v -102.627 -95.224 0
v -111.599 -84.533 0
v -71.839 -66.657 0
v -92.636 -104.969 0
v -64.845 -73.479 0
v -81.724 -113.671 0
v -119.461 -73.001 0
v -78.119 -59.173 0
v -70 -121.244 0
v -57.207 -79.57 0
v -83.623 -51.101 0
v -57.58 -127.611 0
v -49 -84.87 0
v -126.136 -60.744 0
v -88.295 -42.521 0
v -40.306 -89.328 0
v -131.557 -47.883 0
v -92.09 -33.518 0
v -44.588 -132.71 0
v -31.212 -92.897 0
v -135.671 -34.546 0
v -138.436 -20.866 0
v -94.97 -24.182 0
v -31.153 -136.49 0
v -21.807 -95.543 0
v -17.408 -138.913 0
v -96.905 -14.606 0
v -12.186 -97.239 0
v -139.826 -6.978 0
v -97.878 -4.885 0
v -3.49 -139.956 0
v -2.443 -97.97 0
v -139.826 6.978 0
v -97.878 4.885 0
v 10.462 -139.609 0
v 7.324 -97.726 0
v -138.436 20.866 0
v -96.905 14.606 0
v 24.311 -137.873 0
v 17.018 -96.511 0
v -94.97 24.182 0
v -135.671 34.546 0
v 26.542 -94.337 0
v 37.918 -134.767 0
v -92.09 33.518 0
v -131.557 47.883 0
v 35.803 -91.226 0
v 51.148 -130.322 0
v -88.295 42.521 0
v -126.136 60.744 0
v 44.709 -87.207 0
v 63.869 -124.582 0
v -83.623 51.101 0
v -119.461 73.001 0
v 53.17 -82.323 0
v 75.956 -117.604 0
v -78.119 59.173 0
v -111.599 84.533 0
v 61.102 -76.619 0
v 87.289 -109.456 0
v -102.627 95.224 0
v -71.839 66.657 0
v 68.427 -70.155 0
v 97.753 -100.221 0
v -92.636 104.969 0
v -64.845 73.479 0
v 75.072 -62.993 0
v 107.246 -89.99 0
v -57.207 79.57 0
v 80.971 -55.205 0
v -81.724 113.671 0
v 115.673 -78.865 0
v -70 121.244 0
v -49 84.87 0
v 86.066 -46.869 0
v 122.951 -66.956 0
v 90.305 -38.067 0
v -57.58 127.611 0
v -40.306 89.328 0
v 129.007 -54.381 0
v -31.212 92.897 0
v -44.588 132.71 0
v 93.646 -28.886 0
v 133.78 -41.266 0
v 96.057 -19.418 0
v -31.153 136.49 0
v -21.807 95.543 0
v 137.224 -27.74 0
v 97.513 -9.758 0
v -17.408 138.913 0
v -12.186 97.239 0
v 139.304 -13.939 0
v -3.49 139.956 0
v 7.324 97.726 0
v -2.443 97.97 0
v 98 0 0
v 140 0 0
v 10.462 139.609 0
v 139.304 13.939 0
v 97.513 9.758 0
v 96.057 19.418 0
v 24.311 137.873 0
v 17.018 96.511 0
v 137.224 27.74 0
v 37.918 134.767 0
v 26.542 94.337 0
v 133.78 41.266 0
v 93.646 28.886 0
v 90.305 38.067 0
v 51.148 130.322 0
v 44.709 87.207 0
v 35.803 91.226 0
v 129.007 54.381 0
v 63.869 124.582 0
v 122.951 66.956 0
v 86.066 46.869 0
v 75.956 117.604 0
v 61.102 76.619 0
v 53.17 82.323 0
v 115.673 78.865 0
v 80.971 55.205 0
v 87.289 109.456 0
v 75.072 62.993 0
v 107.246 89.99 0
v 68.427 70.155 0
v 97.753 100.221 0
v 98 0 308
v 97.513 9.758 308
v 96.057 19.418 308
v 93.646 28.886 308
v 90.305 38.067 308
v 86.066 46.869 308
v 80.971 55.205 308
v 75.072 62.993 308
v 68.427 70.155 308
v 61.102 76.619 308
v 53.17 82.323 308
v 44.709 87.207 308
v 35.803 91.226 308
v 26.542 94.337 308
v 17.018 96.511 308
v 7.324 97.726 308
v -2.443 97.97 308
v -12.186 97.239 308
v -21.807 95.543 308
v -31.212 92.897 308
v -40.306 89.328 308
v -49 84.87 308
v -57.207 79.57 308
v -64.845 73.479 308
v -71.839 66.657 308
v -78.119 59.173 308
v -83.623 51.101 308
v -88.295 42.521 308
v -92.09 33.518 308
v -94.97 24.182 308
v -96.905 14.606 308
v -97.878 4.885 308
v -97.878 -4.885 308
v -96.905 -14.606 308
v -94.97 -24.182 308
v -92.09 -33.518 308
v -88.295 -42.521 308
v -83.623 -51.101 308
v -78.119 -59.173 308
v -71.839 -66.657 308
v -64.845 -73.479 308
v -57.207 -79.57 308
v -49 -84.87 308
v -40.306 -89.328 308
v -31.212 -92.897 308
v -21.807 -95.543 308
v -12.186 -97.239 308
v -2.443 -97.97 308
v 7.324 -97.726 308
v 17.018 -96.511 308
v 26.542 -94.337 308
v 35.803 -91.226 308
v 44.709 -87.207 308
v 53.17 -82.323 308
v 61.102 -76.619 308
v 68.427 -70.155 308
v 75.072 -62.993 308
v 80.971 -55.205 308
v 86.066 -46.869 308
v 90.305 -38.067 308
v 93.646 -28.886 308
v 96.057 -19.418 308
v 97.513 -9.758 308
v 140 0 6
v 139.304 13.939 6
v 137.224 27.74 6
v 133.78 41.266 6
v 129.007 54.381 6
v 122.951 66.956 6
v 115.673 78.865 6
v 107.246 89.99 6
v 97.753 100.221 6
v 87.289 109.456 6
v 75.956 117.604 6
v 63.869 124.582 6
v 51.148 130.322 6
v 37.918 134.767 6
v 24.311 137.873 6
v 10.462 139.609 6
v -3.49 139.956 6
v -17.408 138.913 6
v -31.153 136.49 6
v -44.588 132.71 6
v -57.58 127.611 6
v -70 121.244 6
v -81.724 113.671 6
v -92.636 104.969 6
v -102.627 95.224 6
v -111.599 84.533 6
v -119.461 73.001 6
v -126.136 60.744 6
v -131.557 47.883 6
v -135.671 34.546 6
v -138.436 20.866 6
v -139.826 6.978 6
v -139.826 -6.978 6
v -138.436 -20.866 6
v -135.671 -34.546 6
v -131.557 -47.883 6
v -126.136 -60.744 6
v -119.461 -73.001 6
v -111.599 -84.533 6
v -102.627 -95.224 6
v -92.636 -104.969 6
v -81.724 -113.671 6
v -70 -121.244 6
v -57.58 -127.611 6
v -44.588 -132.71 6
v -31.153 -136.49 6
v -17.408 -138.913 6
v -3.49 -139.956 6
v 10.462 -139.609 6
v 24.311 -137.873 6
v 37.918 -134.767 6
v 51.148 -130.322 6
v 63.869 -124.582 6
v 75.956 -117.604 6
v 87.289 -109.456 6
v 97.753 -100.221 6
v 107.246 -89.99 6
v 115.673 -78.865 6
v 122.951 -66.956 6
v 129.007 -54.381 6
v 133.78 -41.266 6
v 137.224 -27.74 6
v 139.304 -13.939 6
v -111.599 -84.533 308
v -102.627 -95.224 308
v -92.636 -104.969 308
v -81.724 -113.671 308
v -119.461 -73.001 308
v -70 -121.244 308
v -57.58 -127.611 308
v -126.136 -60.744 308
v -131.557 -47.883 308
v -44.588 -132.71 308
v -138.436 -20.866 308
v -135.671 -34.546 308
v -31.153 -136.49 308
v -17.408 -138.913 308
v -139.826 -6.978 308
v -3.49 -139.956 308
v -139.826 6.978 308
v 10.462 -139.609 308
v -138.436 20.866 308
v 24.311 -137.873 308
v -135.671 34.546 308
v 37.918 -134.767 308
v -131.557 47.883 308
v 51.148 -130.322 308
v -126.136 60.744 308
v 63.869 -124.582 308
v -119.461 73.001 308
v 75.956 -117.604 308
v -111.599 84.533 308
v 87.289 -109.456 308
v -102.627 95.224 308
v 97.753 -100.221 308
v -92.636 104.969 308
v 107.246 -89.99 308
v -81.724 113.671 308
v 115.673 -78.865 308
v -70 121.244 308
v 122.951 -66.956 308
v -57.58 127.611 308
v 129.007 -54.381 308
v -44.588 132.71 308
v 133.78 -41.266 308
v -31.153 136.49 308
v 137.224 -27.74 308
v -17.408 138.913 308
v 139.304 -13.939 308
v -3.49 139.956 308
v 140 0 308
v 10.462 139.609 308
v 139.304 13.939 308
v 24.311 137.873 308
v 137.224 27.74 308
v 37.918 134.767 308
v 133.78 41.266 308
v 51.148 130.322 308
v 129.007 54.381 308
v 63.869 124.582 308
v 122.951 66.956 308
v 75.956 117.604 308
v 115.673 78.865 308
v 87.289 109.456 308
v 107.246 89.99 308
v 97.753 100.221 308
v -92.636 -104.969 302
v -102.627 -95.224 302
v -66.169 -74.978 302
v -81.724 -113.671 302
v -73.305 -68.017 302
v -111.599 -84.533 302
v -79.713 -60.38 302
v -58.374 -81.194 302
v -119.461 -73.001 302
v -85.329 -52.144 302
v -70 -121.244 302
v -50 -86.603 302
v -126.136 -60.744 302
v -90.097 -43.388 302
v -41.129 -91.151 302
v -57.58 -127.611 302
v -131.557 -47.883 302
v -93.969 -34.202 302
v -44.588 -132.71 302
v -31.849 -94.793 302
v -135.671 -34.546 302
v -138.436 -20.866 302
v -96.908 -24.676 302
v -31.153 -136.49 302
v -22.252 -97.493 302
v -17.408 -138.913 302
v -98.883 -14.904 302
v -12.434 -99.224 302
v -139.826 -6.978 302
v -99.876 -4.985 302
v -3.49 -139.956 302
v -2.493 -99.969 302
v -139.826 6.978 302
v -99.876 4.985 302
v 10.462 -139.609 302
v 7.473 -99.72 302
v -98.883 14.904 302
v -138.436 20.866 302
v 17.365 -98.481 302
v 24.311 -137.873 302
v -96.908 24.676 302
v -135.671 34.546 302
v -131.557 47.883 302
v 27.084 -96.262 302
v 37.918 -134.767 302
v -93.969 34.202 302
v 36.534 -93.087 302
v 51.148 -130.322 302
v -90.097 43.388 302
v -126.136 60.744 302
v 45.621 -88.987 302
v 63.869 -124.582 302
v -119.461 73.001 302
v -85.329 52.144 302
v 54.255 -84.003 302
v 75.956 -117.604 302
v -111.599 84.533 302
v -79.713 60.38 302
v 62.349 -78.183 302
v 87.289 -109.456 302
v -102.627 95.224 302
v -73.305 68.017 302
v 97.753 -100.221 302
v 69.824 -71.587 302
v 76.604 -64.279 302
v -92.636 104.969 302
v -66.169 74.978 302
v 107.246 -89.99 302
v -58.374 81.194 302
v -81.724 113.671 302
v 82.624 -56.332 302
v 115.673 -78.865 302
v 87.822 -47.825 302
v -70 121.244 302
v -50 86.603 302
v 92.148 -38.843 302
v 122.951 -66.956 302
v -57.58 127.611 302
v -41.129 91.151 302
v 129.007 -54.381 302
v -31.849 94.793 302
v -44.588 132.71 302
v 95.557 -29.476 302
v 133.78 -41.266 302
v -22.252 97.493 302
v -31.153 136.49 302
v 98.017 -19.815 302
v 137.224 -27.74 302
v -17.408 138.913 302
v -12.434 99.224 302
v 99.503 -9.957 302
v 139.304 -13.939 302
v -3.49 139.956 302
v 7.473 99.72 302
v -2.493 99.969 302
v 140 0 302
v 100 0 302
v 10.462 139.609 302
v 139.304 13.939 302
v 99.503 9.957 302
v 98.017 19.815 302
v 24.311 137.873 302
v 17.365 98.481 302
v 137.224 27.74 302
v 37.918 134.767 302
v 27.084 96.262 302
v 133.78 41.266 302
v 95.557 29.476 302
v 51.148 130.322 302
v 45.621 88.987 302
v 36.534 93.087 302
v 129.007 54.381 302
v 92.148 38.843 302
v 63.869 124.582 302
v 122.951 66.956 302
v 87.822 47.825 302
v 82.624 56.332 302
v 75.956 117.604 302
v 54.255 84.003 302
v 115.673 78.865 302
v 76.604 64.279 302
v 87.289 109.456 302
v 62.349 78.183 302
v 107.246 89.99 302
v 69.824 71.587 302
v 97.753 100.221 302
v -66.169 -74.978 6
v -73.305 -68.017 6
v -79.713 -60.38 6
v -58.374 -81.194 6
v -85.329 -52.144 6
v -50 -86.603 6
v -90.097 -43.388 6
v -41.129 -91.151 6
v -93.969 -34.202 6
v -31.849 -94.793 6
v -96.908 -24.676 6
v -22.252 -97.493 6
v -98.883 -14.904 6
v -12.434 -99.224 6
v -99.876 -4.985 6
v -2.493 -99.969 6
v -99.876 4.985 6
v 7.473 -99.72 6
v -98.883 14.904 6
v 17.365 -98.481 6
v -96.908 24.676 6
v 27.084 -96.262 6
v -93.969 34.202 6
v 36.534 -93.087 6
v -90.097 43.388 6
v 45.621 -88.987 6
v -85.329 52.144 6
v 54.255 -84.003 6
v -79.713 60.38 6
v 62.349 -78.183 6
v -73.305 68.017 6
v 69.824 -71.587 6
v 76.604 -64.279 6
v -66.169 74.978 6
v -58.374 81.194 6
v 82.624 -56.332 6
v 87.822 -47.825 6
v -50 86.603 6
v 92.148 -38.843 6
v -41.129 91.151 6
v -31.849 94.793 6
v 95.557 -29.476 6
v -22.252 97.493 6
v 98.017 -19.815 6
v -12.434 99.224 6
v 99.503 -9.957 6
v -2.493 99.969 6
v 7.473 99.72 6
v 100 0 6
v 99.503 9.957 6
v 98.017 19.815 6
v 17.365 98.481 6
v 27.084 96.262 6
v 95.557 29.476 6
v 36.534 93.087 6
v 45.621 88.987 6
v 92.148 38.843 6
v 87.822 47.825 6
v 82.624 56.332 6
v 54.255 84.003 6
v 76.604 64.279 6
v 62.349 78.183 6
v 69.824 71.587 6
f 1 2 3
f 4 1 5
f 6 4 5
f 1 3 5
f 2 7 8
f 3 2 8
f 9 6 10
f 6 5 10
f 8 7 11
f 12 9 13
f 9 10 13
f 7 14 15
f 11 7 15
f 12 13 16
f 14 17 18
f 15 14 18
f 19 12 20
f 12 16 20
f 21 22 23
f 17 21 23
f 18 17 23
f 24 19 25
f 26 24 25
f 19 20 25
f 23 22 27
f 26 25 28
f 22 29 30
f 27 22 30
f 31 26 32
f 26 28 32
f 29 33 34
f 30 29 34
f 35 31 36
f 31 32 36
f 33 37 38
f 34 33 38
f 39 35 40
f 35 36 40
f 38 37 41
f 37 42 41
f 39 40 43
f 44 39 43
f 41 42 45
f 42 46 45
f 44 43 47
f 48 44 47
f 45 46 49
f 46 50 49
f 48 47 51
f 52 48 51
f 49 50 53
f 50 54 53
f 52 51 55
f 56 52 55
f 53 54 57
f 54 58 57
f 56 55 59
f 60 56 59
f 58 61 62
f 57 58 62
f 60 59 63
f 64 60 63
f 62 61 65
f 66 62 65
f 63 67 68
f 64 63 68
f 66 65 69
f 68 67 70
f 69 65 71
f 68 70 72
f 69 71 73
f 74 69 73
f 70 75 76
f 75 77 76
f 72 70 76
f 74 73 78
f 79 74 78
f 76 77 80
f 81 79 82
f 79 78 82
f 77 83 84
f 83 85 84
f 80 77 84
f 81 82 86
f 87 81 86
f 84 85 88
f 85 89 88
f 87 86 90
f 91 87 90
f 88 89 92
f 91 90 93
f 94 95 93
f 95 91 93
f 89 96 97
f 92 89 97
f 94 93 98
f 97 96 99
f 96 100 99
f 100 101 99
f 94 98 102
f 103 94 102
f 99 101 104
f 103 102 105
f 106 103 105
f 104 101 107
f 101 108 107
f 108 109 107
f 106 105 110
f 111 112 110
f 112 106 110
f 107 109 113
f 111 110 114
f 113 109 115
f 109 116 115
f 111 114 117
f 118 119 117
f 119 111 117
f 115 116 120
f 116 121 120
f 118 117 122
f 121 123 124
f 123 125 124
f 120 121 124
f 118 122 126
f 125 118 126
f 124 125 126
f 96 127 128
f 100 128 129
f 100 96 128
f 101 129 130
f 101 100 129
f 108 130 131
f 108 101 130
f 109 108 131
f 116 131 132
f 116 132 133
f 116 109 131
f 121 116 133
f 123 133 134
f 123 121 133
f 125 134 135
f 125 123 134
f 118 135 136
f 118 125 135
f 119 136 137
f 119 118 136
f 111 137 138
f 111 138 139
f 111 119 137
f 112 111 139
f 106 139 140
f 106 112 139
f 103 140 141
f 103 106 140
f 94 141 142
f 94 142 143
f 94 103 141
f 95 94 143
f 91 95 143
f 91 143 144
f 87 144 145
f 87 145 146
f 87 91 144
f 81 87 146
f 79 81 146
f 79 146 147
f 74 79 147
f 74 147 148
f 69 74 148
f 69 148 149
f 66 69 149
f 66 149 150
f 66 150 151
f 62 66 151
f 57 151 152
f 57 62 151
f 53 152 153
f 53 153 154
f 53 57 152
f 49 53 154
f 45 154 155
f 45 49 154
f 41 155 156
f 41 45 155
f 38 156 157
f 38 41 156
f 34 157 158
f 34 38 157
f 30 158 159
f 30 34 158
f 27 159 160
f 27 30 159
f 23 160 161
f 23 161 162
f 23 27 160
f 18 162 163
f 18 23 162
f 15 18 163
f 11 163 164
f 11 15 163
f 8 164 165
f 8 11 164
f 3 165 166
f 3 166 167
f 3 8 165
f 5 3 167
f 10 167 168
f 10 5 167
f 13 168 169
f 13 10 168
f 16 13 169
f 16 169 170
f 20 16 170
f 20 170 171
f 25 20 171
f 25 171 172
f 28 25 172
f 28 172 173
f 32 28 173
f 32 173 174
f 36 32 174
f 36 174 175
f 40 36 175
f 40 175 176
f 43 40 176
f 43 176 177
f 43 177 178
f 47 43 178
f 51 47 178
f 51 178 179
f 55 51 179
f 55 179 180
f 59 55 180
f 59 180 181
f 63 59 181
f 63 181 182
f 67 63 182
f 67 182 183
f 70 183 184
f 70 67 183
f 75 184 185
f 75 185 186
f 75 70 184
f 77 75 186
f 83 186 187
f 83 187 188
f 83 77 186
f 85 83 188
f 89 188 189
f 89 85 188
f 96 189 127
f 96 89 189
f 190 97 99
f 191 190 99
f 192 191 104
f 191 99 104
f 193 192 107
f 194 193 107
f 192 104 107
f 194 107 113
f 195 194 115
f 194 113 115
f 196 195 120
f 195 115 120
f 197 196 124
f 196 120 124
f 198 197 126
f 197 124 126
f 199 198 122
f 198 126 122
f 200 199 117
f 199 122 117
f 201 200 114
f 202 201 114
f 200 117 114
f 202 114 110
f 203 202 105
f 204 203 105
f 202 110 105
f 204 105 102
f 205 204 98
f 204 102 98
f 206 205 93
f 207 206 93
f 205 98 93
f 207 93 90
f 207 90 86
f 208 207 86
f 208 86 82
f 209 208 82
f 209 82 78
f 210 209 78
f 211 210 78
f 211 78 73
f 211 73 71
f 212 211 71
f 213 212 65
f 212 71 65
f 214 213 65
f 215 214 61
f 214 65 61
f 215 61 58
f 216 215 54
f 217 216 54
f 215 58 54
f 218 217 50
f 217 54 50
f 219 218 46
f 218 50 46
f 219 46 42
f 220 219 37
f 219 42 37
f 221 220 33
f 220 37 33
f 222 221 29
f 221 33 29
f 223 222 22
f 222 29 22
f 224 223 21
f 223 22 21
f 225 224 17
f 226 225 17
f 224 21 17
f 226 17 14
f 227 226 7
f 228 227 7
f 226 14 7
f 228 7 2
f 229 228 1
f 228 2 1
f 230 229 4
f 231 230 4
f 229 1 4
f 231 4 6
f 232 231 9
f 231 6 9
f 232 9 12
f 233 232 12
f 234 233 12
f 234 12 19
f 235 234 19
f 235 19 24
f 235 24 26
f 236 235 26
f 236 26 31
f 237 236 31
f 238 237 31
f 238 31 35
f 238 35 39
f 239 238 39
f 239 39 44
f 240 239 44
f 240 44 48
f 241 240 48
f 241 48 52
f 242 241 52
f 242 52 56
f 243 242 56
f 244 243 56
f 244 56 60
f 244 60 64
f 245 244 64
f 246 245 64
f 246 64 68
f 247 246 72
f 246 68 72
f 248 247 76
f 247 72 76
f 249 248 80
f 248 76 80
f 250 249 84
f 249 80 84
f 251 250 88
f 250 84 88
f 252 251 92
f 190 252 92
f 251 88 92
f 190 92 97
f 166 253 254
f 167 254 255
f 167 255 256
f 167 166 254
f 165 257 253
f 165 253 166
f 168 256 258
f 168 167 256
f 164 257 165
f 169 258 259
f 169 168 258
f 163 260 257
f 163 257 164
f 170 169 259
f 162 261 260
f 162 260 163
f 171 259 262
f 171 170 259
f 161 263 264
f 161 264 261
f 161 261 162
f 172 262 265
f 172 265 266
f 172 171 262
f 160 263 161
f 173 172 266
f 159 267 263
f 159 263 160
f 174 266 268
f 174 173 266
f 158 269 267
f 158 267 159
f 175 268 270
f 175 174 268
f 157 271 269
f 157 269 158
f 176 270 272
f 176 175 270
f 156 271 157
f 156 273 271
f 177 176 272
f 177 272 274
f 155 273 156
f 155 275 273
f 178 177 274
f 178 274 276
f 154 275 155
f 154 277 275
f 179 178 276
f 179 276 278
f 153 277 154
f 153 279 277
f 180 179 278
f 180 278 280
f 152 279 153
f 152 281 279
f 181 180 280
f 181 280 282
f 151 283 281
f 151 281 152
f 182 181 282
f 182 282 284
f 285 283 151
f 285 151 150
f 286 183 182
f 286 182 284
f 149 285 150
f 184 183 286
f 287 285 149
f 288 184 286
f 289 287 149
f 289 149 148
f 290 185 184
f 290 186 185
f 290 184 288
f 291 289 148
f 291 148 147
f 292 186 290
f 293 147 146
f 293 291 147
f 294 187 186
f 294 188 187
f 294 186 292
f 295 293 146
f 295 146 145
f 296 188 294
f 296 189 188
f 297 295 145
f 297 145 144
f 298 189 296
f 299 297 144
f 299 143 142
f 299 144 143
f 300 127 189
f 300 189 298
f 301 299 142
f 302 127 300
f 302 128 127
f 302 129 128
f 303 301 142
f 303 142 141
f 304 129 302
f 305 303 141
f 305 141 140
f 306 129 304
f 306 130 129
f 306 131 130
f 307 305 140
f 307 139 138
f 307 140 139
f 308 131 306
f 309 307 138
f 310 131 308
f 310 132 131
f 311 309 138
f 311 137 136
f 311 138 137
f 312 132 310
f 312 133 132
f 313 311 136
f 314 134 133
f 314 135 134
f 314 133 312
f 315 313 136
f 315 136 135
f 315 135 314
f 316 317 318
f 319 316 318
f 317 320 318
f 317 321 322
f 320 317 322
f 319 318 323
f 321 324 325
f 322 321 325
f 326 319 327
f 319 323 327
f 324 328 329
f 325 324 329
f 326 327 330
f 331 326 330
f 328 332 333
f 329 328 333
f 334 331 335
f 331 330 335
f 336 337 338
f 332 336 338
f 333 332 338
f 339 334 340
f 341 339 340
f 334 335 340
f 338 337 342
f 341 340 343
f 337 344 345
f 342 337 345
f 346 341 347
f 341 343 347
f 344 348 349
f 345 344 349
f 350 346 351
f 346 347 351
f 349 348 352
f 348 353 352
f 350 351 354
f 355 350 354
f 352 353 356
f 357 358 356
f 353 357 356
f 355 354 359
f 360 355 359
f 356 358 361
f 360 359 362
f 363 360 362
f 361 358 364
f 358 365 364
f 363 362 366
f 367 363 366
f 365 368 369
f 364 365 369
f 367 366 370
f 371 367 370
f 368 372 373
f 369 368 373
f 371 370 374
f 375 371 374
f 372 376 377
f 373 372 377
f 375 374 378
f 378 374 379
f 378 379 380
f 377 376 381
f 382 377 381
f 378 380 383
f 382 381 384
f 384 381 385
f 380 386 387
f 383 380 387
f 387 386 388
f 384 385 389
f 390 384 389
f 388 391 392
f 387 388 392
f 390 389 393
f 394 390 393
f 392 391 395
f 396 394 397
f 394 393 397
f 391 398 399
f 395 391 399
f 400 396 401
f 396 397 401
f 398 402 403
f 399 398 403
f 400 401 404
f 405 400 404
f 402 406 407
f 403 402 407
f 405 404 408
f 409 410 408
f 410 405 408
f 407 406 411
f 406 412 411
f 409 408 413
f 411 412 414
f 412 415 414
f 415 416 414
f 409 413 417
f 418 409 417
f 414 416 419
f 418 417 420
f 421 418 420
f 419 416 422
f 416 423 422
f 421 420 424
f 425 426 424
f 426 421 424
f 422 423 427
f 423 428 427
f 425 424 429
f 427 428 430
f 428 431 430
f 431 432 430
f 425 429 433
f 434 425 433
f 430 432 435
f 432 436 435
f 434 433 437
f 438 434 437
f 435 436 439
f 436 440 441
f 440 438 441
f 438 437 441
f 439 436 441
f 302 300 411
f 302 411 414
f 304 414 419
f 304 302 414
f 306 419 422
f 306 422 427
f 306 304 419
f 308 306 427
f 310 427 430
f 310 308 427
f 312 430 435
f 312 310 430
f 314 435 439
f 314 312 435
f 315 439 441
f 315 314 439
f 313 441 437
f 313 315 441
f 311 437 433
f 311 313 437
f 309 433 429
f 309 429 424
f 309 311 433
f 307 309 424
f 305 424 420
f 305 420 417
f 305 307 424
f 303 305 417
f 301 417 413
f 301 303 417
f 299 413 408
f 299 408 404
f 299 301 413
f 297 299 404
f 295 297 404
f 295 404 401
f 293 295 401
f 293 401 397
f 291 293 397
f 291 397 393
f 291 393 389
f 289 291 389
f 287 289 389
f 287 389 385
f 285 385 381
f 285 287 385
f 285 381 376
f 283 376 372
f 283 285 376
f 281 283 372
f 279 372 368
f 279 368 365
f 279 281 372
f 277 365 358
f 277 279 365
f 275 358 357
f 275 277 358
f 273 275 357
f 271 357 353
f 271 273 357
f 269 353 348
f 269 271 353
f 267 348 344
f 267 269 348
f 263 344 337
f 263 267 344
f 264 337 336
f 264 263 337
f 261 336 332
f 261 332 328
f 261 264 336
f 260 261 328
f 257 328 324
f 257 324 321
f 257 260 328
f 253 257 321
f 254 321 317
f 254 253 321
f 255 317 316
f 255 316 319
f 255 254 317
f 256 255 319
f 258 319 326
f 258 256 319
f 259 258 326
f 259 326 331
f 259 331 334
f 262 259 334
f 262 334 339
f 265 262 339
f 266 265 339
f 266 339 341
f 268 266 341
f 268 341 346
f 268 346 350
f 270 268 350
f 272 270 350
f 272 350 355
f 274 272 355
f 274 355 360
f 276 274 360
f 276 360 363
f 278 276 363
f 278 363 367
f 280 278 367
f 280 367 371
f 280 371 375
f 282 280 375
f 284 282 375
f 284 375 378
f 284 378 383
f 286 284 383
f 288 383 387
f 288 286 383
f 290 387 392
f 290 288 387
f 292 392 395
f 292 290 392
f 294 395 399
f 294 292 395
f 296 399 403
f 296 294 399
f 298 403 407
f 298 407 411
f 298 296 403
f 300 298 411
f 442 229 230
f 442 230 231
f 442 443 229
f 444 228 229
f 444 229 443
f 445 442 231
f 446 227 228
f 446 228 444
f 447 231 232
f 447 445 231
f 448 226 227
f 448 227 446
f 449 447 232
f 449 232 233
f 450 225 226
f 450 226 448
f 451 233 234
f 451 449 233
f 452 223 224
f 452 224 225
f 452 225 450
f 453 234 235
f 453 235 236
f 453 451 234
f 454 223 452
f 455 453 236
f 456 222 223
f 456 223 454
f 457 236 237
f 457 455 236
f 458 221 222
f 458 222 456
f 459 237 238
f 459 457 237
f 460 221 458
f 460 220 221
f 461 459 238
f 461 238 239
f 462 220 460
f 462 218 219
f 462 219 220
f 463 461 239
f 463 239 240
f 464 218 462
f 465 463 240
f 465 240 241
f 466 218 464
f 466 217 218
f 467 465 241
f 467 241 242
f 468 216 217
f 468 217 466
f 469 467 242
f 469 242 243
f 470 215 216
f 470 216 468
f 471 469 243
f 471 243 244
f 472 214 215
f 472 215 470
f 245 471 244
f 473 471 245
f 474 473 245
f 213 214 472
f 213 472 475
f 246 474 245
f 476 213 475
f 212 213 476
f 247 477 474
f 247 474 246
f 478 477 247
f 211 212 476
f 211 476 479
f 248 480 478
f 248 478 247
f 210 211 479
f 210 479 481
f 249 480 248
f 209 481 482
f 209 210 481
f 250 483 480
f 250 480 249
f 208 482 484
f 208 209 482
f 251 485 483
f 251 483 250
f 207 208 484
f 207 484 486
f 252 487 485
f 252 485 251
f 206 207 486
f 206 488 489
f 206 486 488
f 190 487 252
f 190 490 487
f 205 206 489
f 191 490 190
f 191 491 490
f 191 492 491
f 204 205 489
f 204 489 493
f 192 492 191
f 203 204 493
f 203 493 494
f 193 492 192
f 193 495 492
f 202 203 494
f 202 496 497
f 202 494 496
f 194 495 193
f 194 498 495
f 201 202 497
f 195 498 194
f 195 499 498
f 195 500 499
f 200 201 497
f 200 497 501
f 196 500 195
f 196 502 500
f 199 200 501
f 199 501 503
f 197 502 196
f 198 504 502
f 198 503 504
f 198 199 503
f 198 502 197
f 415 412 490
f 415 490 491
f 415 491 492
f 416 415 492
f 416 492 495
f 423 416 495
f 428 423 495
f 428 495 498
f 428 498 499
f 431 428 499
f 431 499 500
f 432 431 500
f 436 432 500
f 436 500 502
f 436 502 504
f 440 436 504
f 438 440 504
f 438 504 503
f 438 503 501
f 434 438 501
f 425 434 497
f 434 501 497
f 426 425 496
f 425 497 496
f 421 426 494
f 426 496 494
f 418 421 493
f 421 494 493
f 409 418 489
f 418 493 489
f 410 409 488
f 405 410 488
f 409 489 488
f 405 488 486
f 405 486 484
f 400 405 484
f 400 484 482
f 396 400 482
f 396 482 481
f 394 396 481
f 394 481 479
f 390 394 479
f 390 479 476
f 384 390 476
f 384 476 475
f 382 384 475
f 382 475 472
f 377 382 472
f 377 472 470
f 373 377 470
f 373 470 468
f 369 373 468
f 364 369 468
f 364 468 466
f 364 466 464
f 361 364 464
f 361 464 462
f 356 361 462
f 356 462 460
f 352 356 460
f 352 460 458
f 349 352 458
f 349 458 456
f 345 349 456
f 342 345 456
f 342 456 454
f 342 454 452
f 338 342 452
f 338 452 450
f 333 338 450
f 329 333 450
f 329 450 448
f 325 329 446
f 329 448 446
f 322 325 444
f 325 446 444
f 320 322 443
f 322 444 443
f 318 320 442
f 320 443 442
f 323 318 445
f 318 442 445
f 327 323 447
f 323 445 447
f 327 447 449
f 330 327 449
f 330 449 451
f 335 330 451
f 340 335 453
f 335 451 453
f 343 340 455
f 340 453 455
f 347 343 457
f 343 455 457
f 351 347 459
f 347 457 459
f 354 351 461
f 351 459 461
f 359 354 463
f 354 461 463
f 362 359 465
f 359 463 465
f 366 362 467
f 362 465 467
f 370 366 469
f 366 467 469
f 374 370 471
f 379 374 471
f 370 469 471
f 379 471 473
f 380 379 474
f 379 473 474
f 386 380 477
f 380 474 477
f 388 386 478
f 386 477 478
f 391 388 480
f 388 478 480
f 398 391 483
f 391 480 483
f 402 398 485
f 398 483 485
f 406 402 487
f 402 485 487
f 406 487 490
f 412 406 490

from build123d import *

# Parameters (mm, degrees)
SKETCH1_R           = 100
SKETCH1_R_2         = 98
EXTRUDE_THIN1_DEPTH = 308
SKETCH2_R           = 140
SKETCH2_R_2         = 100
BOSS_EXTRUDE1_DEPTH = 6


with BuildPart() as part:
    # Sketch1 → Extrude-Thin1 (new body)
    with BuildSketch(Plane.XY):
        Circle(SKETCH1_R)
        Circle(SKETCH1_R_2, mode=Mode.SUBTRACT)
    extrude_thin1 = extrude(amount=EXTRUDE_THIN1_DEPTH)

    # Sketch2 → Boss-Extrude1 (add)
    with BuildSketch(Plane.XY.offset(308)):
        Circle(SKETCH2_R)
        Circle(SKETCH2_R_2, mode=Mode.SUBTRACT)
    boss_extrude1 = extrude(amount=-BOSS_EXTRUDE1_DEPTH)

    # Mirror1: Extrude-Thin1, Boss-Extrude1 across plane
    add(extrude_thin1.mirror(Plane(origin=(0, 0, 154), x_dir=(1, 0, 0), z_dir=(0, 0, -1))))
    add(boss_extrude1.mirror(Plane(origin=(0, 0, 154), x_dir=(1, 0, 0), z_dir=(0, 0, -1))))


solid = part.part
